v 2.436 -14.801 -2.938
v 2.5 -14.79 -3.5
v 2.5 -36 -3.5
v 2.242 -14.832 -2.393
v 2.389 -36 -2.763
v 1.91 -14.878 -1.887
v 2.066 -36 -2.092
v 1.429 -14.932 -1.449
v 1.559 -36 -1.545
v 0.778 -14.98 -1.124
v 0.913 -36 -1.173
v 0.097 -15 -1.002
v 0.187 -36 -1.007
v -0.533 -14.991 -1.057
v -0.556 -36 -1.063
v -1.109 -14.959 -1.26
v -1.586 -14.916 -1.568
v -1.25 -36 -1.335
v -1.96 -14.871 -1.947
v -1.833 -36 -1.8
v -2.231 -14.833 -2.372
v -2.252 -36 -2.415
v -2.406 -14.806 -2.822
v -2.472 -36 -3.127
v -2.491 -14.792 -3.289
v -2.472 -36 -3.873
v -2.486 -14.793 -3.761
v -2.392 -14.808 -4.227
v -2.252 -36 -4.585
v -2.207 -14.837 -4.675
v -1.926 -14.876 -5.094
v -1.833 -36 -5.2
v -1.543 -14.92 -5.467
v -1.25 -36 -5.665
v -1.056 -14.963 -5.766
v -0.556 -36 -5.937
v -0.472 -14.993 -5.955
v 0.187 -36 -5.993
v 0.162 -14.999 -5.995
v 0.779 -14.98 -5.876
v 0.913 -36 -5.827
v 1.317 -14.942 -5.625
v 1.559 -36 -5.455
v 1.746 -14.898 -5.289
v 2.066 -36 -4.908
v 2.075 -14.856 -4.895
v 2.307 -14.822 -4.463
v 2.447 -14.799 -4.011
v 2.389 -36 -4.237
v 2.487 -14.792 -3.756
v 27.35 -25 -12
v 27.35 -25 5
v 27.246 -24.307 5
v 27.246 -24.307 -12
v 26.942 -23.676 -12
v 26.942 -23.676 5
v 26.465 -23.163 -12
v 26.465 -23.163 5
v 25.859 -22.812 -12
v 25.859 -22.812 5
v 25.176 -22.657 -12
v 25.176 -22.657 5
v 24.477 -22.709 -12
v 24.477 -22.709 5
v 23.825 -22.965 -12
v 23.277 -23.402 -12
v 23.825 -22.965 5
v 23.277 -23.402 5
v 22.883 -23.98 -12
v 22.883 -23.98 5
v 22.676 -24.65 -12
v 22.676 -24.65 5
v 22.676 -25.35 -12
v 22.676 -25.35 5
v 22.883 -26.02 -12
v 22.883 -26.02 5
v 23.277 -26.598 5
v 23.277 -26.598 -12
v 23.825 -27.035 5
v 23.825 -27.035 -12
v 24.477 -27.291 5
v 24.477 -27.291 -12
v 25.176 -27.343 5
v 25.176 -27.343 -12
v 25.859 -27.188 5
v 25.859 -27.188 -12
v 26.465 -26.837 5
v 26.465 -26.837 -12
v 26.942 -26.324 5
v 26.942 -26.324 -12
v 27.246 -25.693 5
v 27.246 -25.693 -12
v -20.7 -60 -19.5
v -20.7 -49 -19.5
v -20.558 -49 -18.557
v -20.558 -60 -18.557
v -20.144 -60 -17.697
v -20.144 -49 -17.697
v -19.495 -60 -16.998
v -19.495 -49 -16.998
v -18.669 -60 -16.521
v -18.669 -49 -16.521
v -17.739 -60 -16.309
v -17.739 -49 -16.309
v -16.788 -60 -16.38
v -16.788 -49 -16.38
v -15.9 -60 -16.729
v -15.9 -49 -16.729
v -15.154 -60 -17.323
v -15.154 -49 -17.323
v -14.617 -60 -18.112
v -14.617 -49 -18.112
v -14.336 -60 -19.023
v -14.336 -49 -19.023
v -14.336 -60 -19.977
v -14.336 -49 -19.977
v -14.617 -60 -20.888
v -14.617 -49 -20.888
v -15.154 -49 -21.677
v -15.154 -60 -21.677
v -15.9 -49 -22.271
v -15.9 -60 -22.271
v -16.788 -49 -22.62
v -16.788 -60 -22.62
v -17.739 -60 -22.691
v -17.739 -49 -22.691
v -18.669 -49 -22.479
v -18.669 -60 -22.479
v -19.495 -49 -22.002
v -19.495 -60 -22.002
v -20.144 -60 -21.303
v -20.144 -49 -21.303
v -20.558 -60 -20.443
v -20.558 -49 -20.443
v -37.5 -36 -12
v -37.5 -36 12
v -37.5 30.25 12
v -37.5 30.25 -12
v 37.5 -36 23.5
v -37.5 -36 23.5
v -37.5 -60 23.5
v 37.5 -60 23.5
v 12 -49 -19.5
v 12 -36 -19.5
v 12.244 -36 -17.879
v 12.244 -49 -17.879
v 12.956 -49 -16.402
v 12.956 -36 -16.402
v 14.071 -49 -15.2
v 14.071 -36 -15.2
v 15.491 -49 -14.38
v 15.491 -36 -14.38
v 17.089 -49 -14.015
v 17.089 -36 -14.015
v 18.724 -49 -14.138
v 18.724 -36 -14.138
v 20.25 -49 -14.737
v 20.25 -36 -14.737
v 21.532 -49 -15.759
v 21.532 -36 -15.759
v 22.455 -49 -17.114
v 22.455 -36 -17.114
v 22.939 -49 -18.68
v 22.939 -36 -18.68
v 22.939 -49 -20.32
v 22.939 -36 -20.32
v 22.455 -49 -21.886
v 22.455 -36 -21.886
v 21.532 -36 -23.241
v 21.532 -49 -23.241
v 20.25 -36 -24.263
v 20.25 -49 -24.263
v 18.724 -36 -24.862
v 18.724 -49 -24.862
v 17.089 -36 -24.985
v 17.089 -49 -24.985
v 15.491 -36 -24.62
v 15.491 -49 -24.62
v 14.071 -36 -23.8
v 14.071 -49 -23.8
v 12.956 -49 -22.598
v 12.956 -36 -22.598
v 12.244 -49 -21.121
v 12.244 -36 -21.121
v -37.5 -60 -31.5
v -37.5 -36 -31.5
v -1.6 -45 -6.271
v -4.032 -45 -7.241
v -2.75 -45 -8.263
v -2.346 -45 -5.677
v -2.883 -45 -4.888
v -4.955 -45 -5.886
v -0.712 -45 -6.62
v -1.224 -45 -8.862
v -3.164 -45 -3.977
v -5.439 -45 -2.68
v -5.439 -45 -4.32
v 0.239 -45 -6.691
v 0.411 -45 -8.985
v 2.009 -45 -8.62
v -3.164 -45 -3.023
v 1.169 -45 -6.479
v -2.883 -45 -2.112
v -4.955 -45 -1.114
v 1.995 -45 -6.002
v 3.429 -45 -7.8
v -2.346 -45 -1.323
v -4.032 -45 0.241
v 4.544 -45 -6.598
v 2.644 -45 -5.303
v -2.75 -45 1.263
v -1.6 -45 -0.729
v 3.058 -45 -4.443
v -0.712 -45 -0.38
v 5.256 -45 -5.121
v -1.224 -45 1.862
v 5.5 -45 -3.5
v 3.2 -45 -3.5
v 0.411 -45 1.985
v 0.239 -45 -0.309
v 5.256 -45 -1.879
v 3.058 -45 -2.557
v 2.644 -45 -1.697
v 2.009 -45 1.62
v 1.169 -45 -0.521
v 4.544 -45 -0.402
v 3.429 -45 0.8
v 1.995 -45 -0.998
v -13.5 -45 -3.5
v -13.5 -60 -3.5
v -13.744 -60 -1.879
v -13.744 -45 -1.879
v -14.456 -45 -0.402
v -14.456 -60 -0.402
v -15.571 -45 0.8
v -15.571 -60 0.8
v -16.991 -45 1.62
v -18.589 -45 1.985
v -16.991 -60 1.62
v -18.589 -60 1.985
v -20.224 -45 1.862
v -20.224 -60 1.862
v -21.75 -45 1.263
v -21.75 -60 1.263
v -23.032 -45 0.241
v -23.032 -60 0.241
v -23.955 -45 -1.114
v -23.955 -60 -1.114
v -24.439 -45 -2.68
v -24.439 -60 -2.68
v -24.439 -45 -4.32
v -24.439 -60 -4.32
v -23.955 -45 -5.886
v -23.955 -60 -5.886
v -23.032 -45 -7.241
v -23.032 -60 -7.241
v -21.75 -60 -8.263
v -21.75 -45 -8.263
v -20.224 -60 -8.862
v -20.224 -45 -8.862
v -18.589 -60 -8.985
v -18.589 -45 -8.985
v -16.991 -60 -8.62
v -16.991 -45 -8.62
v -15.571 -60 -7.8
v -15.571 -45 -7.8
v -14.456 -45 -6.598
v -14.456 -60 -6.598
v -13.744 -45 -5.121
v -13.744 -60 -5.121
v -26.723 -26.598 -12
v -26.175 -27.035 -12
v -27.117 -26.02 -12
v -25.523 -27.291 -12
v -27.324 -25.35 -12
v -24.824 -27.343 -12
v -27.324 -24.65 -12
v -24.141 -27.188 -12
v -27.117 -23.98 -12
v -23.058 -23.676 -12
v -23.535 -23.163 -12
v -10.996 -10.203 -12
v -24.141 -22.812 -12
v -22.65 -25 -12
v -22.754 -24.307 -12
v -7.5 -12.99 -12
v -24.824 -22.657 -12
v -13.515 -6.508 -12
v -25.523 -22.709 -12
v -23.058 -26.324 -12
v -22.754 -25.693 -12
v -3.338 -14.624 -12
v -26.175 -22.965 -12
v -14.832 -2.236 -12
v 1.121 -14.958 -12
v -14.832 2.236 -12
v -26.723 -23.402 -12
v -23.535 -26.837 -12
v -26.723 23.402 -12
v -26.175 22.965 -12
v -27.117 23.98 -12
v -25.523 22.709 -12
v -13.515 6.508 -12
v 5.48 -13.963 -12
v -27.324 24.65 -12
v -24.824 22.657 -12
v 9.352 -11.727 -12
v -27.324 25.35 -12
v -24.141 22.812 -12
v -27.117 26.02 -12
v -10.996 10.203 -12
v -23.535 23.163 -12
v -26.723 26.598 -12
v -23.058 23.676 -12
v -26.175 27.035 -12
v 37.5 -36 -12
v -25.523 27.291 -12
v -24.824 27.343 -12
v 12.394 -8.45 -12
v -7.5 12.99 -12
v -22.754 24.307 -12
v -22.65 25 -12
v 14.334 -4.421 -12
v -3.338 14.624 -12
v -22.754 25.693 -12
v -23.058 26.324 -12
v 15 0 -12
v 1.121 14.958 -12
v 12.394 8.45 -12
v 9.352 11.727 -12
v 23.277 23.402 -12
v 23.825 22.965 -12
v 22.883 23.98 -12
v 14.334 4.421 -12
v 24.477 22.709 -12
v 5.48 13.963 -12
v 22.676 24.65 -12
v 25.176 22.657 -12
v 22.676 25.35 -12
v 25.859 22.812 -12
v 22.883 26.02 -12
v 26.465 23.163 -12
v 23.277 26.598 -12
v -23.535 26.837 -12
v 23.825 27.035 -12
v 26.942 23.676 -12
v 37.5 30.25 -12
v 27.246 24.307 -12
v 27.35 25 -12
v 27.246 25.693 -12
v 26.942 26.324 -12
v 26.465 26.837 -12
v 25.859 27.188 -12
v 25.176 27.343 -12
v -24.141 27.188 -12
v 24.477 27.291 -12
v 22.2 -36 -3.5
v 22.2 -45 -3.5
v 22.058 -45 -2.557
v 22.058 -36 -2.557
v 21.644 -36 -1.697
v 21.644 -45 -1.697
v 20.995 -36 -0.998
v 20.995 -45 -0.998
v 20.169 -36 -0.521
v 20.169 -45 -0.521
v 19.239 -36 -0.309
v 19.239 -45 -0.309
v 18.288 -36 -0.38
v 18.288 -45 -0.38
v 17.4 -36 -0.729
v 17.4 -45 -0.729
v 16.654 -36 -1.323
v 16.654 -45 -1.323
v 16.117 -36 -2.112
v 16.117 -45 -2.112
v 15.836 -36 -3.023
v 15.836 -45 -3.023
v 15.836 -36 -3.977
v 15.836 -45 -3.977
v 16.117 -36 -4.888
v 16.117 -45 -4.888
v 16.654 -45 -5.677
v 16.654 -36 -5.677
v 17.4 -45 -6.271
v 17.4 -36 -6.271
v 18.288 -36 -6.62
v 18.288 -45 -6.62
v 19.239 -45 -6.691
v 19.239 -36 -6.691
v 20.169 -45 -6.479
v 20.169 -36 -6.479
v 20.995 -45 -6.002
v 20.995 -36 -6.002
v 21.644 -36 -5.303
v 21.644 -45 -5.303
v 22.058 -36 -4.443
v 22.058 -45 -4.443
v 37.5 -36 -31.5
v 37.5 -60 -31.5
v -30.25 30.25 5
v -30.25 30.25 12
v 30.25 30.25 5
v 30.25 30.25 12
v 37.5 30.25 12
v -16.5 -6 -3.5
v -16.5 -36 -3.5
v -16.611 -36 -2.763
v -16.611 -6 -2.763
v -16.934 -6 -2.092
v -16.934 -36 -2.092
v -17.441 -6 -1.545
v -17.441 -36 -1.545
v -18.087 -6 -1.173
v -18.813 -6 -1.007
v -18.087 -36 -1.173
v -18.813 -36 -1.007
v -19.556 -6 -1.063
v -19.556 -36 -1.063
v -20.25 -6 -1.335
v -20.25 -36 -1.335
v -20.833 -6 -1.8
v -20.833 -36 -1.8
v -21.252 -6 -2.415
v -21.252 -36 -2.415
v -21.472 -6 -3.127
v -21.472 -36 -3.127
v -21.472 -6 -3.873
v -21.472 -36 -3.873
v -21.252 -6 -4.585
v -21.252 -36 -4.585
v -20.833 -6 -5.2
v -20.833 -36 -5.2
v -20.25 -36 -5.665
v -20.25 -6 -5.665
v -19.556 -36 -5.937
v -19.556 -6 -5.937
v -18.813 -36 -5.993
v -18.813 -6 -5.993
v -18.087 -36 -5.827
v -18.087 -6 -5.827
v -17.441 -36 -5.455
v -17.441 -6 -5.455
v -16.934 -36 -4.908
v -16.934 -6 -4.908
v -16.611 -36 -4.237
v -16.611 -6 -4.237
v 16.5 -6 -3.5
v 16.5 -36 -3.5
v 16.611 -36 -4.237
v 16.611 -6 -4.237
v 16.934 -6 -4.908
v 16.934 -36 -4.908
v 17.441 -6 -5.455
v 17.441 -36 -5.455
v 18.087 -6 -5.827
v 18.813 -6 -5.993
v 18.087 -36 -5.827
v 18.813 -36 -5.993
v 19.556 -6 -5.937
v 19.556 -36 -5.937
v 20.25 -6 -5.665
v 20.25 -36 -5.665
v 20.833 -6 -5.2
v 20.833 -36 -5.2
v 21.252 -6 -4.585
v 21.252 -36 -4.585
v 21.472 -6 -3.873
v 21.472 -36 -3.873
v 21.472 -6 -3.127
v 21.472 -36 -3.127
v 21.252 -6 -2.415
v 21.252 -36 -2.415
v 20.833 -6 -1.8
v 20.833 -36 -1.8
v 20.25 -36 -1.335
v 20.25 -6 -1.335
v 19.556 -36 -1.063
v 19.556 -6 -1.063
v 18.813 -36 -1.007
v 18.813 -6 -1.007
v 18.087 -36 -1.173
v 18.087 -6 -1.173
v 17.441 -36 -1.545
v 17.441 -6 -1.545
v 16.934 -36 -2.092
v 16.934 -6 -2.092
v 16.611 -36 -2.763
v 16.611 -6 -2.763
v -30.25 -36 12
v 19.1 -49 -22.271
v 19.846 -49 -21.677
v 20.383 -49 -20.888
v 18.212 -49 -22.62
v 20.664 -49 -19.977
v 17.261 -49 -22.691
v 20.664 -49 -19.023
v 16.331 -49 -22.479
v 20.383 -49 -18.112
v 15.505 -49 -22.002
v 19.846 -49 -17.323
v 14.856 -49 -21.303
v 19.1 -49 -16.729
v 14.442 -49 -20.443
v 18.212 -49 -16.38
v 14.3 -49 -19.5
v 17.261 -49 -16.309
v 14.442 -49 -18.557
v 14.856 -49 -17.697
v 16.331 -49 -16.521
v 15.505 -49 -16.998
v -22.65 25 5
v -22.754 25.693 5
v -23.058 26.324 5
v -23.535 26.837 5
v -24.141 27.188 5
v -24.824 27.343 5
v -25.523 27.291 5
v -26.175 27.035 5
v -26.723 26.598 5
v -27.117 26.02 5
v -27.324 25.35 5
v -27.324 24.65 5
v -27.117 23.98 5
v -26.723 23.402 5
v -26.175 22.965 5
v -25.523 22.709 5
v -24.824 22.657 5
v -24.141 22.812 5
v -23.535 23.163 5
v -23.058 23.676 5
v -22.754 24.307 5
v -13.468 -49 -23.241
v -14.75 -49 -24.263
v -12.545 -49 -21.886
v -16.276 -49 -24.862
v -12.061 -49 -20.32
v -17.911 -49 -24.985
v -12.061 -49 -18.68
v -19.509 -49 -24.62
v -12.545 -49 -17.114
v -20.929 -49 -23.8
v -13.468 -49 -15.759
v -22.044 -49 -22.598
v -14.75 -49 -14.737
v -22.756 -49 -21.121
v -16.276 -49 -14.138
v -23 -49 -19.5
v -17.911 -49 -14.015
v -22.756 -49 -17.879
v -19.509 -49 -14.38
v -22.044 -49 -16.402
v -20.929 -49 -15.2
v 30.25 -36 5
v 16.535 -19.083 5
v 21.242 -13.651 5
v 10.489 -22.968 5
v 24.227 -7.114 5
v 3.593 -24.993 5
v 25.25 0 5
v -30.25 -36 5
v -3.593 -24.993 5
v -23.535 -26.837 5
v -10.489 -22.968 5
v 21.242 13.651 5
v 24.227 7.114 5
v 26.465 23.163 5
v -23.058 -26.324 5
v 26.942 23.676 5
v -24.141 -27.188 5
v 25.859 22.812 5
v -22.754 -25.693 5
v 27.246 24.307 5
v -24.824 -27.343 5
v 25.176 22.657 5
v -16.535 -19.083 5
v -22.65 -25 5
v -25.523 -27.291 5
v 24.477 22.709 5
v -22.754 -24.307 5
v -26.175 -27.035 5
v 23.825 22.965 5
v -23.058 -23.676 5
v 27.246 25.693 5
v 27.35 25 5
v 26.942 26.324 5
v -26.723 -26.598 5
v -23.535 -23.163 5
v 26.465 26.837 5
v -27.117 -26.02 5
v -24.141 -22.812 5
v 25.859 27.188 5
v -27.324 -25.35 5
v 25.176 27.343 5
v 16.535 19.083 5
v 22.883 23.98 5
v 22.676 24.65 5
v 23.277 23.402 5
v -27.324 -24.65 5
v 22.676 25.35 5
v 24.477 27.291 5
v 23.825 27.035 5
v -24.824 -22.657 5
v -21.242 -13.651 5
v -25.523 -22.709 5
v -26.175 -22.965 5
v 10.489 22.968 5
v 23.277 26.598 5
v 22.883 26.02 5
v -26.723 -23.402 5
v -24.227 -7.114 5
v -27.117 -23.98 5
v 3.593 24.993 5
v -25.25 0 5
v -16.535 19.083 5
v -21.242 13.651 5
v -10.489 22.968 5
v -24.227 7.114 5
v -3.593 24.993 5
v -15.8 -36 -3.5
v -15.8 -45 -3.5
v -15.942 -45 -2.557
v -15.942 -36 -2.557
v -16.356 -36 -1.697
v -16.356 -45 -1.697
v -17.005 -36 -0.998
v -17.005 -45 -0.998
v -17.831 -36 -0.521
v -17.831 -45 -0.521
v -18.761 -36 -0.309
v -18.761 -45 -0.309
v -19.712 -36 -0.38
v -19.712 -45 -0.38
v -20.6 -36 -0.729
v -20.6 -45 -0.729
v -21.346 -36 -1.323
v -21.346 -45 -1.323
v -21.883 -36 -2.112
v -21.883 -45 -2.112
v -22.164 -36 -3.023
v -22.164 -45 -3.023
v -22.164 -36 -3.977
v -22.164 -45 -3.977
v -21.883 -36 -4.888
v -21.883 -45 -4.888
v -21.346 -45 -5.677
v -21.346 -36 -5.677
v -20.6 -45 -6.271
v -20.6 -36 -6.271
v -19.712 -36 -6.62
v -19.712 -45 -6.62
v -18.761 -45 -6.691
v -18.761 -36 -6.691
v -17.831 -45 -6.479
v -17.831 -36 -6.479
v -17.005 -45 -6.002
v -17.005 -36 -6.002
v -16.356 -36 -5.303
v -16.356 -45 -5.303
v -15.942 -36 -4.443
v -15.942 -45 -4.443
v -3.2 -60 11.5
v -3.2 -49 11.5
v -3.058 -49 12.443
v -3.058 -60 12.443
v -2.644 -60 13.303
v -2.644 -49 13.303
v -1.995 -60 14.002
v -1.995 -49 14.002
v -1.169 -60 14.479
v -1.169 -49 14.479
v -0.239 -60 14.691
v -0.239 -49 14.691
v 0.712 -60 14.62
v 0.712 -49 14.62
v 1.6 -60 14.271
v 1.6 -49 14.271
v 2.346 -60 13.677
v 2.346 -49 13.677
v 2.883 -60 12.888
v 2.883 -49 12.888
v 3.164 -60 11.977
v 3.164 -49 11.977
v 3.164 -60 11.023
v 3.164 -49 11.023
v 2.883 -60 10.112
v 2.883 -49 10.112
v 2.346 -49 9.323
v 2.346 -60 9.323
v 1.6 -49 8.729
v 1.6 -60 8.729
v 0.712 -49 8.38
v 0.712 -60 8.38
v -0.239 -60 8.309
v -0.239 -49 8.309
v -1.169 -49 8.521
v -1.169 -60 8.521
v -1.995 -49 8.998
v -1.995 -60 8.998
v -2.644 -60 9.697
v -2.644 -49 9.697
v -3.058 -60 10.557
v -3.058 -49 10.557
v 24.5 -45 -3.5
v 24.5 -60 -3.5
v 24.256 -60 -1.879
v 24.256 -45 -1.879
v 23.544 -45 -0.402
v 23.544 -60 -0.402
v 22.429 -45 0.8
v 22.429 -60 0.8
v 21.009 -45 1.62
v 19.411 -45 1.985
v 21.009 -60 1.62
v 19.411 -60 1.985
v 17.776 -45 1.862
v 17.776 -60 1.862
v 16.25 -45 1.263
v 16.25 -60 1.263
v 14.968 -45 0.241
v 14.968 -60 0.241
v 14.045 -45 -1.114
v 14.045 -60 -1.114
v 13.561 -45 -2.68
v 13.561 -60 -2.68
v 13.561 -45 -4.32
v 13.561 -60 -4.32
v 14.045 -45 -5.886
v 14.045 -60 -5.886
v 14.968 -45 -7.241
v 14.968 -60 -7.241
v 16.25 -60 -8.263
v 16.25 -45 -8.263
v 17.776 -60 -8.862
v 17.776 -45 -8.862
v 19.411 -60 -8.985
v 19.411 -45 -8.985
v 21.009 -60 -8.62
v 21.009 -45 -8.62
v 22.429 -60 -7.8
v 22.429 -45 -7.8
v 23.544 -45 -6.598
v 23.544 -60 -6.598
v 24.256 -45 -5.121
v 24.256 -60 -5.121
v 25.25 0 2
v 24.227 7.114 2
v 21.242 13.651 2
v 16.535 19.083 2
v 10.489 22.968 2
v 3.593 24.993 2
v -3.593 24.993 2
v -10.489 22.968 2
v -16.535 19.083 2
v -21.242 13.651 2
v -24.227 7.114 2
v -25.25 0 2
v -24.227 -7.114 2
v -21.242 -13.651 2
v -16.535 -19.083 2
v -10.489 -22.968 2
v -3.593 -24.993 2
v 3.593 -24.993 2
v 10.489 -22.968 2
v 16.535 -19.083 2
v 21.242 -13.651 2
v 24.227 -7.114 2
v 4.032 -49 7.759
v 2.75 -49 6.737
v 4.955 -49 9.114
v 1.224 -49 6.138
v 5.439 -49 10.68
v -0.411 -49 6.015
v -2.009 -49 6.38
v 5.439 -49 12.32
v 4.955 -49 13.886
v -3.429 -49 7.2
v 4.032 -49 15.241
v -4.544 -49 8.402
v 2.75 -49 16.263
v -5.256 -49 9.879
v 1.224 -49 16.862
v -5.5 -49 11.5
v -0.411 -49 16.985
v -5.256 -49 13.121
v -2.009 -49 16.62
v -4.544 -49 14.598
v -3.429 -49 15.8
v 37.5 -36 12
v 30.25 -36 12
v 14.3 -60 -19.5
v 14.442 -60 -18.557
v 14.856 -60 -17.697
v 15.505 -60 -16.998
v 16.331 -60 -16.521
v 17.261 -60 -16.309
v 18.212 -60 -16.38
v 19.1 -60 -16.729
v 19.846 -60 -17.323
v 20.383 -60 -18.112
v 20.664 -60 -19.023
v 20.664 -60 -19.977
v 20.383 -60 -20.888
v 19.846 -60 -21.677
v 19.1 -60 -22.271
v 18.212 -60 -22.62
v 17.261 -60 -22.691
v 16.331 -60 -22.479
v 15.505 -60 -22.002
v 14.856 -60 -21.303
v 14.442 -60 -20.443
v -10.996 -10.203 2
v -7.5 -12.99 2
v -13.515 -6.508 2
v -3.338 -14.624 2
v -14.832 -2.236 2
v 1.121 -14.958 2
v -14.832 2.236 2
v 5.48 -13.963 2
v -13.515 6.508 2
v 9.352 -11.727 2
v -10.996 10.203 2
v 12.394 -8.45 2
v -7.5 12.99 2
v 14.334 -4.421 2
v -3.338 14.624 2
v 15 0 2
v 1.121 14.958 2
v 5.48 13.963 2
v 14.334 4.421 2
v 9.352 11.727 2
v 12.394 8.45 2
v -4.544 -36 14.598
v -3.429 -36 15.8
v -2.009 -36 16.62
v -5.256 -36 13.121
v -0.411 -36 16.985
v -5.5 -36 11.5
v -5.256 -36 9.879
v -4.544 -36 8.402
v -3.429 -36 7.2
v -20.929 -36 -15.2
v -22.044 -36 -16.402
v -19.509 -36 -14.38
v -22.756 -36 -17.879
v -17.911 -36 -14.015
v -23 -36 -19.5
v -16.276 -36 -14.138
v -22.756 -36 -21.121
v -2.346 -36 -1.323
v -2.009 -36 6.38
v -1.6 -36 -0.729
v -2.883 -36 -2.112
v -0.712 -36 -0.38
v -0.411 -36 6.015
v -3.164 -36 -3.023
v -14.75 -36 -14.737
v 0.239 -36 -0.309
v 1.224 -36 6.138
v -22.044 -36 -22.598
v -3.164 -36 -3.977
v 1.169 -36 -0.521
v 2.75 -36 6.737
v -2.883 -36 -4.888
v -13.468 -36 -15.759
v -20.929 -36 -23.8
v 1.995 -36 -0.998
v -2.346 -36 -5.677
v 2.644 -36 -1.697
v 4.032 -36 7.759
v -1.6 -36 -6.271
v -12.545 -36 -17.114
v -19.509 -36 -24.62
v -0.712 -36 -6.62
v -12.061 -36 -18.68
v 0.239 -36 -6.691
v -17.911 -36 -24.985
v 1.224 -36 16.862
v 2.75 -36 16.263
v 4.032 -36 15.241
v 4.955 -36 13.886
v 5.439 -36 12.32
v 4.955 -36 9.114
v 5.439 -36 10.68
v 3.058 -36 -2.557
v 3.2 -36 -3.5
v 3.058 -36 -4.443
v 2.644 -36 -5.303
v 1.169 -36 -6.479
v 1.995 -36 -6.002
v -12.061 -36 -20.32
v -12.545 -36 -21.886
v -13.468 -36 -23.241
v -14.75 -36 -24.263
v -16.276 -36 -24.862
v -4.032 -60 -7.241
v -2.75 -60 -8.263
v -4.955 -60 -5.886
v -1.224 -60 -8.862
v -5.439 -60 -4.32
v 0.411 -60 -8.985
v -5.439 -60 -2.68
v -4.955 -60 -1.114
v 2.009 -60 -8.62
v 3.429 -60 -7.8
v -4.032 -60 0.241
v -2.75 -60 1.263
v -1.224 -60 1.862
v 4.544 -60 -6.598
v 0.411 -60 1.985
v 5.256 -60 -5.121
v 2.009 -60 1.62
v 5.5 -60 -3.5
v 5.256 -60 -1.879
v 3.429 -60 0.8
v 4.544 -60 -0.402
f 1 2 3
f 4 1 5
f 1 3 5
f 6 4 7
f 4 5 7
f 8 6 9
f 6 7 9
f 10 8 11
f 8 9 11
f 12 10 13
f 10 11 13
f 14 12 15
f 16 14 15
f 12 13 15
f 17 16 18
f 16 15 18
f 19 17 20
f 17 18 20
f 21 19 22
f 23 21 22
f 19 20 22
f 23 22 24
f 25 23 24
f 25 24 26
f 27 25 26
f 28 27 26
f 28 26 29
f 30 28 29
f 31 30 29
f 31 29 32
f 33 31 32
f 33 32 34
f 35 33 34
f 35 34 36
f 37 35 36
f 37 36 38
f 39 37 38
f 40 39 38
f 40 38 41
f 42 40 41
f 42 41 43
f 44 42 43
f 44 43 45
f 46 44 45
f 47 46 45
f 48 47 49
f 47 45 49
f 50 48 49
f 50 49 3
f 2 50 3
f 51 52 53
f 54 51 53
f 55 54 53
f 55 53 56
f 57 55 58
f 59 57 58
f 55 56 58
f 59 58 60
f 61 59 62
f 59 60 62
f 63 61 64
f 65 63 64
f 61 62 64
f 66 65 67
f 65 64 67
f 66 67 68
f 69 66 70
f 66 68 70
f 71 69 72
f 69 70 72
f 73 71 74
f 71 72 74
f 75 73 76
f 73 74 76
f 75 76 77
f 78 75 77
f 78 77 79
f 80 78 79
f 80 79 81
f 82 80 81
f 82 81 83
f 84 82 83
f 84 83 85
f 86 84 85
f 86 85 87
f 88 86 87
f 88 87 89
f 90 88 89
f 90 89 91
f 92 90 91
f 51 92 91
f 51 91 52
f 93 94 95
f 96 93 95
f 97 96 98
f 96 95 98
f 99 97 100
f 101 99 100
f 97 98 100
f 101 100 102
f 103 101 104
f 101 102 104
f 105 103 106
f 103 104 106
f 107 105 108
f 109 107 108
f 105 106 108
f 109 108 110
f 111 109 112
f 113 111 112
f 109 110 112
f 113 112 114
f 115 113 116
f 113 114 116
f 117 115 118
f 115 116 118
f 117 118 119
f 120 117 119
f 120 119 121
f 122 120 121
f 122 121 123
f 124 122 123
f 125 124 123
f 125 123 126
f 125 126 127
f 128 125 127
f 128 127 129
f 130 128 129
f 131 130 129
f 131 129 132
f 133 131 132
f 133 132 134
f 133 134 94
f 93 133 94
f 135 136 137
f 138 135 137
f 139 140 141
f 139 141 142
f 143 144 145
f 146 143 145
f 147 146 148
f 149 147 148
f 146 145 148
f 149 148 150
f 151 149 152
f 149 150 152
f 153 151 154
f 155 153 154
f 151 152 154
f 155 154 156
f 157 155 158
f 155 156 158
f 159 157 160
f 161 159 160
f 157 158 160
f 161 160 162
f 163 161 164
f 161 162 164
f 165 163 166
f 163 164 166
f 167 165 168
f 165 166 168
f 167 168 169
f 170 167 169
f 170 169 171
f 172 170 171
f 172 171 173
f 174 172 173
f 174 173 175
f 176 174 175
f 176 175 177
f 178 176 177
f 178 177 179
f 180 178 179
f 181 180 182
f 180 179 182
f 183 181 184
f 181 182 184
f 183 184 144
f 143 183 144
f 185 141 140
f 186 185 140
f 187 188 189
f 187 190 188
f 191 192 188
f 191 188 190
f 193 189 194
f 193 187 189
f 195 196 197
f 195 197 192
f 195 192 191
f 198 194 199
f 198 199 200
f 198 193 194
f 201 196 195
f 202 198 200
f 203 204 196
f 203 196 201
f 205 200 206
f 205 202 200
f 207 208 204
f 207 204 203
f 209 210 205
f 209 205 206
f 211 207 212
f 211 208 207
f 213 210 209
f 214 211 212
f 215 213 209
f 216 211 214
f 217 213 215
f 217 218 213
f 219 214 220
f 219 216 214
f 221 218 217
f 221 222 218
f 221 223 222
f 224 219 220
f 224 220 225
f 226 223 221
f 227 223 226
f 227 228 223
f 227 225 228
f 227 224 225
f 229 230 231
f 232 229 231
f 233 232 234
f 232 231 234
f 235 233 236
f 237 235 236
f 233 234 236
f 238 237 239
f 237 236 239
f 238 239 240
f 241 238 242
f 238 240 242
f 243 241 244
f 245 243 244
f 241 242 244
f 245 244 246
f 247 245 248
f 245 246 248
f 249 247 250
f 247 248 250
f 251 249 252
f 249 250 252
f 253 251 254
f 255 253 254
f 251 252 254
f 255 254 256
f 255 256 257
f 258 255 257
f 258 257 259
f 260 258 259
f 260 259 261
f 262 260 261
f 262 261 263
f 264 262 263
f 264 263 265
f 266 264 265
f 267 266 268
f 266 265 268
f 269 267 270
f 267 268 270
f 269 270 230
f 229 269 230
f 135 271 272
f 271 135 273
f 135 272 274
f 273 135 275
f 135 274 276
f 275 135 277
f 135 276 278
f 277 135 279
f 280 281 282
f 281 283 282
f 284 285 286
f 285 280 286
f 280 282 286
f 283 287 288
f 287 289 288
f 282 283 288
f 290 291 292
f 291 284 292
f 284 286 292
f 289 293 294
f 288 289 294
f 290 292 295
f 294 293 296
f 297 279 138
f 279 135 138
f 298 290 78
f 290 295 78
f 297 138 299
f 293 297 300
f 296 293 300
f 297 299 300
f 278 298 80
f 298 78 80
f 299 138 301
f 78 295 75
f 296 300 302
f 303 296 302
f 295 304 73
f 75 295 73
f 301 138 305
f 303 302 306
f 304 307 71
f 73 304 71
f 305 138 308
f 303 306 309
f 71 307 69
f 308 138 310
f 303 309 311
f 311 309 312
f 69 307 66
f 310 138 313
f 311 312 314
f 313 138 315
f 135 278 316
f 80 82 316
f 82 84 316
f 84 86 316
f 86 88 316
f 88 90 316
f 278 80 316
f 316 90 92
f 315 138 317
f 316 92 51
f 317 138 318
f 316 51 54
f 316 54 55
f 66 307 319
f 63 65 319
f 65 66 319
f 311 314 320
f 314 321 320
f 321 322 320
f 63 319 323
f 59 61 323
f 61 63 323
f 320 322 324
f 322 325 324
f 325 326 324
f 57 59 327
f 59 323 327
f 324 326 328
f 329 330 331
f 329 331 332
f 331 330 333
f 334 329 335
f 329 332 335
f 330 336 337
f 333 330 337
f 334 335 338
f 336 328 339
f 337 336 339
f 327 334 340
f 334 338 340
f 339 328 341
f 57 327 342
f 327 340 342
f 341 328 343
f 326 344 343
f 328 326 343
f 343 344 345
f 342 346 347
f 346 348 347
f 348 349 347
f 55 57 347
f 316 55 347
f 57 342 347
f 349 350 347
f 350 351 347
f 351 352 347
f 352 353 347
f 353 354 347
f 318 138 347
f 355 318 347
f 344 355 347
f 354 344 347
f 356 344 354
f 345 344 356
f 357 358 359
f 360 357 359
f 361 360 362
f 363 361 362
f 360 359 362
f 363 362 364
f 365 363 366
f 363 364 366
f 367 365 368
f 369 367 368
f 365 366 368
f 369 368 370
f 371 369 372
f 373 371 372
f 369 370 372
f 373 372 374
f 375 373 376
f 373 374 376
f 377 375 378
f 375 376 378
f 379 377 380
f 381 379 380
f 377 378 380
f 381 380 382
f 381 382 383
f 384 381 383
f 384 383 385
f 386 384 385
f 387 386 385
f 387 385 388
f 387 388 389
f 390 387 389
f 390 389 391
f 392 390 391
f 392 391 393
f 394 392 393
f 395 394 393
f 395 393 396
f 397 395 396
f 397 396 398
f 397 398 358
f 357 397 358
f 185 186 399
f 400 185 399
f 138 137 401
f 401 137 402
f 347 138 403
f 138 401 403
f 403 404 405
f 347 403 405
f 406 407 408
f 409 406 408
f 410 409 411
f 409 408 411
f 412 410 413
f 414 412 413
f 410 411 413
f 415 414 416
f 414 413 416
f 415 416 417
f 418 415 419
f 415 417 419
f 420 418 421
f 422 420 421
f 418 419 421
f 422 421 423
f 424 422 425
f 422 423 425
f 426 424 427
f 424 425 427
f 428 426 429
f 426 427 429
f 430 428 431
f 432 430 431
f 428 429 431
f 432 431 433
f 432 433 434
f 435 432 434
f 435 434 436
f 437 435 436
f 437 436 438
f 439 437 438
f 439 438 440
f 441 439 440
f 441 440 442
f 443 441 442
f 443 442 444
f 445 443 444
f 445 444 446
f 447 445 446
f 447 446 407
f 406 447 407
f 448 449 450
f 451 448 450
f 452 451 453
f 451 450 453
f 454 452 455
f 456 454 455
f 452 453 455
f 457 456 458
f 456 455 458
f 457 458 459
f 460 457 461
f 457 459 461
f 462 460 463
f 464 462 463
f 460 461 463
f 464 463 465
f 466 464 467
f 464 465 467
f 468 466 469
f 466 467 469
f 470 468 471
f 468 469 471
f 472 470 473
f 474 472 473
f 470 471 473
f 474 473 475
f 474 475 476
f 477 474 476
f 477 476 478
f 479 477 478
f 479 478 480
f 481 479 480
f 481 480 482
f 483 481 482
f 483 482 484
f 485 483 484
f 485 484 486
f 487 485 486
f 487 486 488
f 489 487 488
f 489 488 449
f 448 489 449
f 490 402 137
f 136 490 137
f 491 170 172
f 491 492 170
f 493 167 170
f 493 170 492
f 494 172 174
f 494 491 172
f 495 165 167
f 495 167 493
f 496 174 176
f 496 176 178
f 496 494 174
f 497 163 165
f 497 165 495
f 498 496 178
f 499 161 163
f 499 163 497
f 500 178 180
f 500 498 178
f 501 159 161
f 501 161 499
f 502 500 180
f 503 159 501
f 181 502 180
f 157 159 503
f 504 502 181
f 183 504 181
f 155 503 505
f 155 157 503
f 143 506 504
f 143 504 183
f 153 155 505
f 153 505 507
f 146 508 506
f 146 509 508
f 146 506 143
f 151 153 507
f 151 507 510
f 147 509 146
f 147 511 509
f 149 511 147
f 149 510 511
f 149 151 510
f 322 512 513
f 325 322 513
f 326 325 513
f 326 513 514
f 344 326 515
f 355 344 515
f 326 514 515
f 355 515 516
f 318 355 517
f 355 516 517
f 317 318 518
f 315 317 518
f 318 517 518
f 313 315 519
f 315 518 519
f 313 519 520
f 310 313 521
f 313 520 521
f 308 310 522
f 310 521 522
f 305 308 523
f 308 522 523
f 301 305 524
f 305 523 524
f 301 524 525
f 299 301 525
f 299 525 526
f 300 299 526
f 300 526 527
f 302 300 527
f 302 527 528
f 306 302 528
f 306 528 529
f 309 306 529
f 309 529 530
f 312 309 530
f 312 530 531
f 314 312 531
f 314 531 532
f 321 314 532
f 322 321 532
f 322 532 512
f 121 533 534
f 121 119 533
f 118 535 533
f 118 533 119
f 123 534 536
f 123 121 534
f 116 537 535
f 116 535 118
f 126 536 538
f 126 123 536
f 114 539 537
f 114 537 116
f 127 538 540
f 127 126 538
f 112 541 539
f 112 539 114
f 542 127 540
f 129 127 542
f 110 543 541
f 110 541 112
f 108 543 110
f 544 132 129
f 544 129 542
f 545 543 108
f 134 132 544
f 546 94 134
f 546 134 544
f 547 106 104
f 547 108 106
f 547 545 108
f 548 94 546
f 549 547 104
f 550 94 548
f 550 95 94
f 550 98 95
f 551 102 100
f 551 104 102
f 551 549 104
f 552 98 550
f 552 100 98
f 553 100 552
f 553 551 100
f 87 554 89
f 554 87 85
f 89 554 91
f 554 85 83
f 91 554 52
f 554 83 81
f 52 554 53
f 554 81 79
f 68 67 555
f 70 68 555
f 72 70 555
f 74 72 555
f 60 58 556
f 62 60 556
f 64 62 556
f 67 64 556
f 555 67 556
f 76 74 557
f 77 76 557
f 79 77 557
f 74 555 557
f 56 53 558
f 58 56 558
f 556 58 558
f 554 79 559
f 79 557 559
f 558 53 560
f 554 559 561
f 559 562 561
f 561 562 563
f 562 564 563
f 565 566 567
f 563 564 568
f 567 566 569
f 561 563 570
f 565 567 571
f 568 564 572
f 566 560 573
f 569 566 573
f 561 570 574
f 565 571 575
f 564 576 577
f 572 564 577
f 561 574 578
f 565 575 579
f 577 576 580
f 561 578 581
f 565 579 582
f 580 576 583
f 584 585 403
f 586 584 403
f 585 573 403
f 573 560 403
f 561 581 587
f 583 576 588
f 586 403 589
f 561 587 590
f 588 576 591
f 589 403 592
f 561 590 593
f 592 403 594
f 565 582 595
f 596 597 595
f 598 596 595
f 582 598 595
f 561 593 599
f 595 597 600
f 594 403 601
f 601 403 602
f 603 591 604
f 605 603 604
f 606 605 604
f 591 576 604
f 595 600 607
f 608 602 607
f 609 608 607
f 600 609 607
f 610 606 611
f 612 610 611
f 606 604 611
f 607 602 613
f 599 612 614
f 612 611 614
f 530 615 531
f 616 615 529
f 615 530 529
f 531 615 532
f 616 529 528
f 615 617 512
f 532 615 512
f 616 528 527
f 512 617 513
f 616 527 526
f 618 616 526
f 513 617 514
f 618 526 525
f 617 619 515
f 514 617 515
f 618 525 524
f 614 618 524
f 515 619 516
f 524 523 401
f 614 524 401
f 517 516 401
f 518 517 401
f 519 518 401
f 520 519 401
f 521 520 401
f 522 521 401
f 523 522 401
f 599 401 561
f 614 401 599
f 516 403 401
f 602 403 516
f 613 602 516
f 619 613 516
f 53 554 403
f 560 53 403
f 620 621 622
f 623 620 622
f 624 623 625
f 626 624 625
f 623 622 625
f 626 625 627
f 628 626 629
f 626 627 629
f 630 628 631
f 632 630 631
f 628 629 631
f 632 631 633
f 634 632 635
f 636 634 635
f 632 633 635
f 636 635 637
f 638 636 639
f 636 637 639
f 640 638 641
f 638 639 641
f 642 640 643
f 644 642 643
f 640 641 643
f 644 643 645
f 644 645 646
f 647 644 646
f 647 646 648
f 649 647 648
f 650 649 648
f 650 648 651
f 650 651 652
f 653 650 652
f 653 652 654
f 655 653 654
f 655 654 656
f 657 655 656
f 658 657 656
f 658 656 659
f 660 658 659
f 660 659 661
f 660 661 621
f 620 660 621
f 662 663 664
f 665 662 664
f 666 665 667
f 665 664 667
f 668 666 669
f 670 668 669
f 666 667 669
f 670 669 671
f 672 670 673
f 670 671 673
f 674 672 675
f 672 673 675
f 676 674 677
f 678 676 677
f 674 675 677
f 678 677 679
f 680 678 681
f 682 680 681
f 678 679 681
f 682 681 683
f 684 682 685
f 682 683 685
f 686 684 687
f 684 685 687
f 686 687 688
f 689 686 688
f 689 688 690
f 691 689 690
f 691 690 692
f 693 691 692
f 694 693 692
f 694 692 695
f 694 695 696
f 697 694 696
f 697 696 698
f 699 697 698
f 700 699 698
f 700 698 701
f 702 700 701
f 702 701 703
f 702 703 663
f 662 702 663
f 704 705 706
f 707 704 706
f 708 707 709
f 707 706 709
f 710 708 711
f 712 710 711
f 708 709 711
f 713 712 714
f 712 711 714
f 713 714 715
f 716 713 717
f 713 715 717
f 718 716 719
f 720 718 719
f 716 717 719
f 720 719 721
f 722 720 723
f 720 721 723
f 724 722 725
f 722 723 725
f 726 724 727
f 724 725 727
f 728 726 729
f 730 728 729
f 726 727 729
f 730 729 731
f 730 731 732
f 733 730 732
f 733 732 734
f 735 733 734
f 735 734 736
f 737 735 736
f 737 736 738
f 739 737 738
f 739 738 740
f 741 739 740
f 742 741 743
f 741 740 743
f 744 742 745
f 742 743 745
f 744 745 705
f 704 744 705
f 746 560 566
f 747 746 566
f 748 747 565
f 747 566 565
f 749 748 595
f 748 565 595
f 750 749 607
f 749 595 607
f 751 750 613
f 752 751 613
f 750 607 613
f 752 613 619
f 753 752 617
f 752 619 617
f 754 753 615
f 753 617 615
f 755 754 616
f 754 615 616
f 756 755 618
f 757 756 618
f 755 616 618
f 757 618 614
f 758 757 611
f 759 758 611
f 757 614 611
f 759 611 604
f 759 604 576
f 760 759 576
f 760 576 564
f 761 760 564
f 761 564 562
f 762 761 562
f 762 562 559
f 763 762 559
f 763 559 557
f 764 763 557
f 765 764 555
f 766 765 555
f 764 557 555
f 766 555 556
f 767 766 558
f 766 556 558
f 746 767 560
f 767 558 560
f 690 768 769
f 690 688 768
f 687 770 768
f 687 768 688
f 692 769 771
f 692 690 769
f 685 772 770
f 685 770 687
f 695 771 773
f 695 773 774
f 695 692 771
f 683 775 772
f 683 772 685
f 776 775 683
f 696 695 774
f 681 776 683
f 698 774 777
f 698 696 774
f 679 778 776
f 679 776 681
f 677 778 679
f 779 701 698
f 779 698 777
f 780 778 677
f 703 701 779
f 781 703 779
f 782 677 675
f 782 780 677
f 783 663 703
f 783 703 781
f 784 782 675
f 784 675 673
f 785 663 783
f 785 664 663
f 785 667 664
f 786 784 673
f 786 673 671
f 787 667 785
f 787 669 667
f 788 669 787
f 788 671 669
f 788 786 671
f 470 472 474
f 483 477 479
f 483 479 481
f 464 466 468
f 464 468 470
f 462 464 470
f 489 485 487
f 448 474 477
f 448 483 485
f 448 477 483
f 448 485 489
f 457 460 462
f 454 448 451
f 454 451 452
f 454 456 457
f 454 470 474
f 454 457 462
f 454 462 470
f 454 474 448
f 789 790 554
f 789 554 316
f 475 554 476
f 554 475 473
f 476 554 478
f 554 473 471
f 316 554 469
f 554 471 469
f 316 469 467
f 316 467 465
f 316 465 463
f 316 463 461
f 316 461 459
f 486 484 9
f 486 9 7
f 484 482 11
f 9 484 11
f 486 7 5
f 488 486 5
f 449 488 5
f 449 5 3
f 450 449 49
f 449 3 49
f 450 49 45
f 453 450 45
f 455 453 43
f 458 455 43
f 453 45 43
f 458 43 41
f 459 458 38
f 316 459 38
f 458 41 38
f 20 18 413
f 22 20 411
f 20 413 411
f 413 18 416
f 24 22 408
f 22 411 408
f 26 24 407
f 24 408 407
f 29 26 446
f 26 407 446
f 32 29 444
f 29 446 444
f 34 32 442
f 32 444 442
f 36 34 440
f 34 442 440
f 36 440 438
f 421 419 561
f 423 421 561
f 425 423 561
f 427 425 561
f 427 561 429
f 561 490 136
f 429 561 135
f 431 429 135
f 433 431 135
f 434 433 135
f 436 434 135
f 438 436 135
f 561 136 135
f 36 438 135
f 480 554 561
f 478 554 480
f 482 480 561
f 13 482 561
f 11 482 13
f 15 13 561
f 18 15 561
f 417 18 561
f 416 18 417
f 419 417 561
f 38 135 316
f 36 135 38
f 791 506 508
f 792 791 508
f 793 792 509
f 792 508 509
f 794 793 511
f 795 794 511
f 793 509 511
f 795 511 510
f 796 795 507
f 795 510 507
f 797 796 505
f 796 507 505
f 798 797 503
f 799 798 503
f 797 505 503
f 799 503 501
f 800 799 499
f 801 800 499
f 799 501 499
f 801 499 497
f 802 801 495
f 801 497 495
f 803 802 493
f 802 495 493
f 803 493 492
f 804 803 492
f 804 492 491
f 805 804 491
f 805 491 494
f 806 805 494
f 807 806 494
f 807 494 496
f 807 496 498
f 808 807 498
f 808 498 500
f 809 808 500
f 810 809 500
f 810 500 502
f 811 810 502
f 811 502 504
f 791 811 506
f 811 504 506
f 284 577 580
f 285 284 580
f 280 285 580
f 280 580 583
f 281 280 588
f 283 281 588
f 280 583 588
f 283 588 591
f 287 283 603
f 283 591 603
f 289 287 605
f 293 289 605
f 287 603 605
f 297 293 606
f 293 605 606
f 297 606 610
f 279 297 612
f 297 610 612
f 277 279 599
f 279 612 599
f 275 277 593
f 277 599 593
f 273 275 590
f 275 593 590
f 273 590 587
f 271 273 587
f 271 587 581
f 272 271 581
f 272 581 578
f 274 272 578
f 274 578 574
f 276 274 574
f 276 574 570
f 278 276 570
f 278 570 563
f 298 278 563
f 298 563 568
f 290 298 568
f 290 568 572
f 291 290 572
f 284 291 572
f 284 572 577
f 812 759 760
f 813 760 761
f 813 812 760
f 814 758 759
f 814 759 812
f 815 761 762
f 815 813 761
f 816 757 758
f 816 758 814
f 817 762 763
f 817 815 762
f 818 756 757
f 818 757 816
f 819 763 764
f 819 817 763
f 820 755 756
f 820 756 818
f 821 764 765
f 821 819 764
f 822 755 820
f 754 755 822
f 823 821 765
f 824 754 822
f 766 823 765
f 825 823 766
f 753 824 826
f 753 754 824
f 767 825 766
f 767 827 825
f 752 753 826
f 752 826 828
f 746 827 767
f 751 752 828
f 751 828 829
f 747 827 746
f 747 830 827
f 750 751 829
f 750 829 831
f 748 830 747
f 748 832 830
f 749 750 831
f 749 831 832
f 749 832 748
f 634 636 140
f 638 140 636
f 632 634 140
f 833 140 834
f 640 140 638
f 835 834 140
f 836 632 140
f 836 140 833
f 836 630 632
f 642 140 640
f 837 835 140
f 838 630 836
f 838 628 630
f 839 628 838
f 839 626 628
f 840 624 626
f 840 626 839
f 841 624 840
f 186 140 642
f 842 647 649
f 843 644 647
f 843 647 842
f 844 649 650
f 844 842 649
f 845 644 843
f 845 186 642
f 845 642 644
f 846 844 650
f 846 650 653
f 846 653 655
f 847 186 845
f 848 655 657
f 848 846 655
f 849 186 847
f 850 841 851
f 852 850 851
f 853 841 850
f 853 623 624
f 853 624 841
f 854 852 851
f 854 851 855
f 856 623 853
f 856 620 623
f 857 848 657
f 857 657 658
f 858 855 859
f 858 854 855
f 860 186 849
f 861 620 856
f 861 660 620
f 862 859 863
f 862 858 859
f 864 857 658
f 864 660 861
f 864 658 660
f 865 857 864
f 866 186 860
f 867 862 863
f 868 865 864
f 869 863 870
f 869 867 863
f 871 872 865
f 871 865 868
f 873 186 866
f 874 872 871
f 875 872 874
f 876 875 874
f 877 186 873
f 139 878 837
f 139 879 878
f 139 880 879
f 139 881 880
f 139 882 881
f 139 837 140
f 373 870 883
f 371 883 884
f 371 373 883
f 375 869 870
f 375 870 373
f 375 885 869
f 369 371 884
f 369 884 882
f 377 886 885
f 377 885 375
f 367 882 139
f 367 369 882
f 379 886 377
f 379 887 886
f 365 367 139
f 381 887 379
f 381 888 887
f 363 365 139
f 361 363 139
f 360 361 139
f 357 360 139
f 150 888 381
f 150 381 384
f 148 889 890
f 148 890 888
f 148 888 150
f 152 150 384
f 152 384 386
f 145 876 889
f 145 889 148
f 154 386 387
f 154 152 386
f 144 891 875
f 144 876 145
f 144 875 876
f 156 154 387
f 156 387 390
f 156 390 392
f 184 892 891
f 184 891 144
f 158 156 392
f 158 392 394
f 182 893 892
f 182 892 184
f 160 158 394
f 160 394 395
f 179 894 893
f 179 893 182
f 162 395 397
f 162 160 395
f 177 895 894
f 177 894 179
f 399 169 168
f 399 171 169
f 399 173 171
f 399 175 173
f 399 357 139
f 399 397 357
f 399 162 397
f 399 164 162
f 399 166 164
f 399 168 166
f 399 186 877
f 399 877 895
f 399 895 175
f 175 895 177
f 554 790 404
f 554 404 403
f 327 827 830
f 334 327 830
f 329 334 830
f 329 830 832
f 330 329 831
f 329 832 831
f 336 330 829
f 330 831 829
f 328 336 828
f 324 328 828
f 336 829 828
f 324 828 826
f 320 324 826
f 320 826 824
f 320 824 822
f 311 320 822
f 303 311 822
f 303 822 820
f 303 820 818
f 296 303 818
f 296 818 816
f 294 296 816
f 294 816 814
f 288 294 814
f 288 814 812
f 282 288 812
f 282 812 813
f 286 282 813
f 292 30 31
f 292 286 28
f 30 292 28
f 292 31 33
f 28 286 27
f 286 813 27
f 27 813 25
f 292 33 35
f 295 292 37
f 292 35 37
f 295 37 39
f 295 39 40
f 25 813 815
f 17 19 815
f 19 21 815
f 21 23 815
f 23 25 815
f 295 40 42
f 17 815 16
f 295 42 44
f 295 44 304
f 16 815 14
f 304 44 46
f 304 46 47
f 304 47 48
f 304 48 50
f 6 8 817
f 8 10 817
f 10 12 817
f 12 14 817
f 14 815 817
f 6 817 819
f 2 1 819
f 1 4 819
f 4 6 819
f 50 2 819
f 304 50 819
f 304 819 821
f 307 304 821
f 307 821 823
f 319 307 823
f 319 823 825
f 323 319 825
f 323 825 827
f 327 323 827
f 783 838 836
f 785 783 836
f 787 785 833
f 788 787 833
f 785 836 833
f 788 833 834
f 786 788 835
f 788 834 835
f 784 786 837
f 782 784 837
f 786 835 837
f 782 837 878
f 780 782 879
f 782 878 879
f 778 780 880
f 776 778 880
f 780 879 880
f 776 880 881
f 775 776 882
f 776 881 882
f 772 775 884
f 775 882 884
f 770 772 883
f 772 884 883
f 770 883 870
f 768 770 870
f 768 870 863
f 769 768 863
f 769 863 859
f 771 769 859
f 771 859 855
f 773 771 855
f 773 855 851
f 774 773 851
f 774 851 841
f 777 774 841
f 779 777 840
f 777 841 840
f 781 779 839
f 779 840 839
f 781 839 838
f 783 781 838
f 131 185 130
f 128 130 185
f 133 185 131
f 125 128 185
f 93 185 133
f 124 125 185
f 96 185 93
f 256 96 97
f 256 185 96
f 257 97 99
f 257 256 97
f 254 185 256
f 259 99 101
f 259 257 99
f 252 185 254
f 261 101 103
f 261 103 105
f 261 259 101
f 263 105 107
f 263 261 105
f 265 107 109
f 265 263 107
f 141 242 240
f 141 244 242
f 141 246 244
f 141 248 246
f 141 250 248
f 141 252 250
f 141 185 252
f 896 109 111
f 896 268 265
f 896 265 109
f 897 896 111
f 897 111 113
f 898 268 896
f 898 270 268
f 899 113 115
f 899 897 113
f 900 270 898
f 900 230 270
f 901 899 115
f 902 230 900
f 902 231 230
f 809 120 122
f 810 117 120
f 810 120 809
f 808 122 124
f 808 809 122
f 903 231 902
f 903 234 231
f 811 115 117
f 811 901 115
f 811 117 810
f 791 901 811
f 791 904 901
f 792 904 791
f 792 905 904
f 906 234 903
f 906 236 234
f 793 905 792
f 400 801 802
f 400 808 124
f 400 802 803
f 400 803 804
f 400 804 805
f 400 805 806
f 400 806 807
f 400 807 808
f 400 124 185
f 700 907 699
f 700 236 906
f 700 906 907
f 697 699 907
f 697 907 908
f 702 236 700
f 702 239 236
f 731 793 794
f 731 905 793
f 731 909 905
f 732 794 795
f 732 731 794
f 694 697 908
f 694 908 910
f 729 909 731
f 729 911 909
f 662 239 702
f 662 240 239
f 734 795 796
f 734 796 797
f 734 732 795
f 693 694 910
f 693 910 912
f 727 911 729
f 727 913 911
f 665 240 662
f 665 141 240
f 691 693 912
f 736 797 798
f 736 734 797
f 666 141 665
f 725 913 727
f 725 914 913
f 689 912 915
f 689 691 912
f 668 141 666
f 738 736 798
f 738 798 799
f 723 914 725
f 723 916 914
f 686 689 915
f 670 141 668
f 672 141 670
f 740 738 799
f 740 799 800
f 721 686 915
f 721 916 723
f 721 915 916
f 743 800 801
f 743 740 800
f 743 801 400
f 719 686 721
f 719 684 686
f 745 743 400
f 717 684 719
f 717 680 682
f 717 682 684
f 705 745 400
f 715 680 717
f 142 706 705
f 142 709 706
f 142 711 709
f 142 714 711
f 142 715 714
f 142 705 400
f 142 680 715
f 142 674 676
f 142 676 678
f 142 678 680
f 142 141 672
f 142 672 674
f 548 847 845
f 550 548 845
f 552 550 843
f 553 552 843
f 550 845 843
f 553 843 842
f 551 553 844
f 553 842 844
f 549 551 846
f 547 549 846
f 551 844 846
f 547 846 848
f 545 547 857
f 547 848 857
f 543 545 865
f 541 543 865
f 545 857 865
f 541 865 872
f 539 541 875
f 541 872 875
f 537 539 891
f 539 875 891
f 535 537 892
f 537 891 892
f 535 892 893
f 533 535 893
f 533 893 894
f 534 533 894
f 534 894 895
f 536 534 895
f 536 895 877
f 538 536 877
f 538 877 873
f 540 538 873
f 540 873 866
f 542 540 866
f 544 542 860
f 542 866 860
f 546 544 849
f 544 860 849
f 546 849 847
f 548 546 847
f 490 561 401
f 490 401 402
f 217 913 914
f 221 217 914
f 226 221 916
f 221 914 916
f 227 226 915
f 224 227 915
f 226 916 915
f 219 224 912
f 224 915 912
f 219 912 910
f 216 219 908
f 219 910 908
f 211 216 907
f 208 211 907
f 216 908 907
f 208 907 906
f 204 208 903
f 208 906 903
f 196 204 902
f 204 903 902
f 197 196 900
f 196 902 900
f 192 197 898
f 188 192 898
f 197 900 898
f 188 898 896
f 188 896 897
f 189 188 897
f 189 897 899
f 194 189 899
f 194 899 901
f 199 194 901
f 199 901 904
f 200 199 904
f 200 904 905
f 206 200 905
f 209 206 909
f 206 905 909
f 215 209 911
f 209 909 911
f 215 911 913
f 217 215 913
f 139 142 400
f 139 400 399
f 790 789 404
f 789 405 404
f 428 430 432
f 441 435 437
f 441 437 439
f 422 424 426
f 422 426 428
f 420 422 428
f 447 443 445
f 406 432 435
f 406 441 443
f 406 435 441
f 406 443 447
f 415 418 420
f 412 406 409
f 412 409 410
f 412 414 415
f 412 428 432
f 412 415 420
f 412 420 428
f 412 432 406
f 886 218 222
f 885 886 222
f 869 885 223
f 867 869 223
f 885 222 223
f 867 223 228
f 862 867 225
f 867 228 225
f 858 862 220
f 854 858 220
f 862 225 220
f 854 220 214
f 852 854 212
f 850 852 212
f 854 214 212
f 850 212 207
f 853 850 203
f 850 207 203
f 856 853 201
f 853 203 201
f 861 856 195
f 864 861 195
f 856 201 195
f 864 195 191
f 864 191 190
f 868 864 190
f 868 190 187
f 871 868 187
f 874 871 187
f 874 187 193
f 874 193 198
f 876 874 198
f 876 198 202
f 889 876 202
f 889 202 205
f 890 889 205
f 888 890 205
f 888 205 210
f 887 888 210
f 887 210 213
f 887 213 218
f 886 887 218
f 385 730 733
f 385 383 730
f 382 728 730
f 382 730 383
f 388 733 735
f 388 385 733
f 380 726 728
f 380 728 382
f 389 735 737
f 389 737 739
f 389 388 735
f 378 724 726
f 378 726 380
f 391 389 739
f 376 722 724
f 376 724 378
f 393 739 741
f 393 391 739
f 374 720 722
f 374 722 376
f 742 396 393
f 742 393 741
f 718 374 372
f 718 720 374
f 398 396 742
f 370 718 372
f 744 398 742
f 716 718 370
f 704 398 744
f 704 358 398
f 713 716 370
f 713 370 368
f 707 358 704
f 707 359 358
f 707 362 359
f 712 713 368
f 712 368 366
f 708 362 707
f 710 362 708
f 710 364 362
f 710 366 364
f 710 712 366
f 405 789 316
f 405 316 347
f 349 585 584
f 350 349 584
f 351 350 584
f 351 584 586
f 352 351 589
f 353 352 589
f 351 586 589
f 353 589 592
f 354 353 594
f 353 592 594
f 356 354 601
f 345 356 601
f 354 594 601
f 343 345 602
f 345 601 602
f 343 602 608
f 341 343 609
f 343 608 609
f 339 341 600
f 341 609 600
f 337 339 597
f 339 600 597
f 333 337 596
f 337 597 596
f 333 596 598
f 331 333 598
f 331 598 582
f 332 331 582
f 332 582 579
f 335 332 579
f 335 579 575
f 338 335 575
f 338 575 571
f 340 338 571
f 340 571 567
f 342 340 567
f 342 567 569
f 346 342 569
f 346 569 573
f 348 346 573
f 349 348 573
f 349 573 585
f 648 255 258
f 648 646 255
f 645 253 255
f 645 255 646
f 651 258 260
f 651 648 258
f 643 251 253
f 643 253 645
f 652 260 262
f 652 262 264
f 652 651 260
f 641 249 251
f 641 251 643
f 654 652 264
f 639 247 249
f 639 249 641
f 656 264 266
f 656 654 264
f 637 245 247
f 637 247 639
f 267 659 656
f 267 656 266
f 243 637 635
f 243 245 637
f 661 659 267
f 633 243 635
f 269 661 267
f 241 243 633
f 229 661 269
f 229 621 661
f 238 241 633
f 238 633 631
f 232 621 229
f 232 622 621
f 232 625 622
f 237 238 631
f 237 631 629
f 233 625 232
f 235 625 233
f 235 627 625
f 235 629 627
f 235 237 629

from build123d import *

# Parameters (mm, degrees)
SKETCH1_W              = 75
SKETCH1_H              = 72
BOSS_EXTRUDE1_DEPTH    = 12
SKETCH3_W              = 60.5
SKETCH3_H              = 60.5
CUT_EXTRUDE2_DEPTH     = 7
SKETCH2_R              = 25.25
CUT_EXTRUDE1_DEPTH     = 3
SKETCH4_R              = 15
CUT_EXTRUDE3_DEPTH     = 29
SKETCH5_W              = 75
SKETCH5_H              = 29.75
BOSS_EXTRUDE2_DEPTH    = 67
SKETCH6_W              = 75
SKETCH6_H              = 5.75
CUT_EXTRUDE4_DEPTH     = 67
SKETCH15_W             = 75
SKETCH15_H             = 55
CUT_EXTRUDE12_DEPTH    = 5.75
SKETCH7_R              = 3.2
CUT_EXTRUDE5_DEPTH     = 67
SKETCH9_OUTSIDE_W      = 112.624
SKETCH9_OUTSIDE_H      = 171.624
SKETCH9_OUTSIDE_W_2    = 75
SKETCH9_OUTSIDE_H_2    = 55
CUT_EXTRUDE7_DEPTH     = 102.411599435
SKETCH8_R              = 5.5
CUT_EXTRUDE6_DEPTH     = 13
SKETCH10_R             = 2.35
CUT_EXTRUDE8_DEPTH     = 80.614697136
SKETCH11_R             = 2.5
CUT_EXTRUDE9_DEPTH     = 54
SKETCH12_R             = 3.2
CUT_EXTRUDE10_DEPTH    = 24
SKETCH13_R             = 5.5
CUT_EXTRUDE11_DEPTH    = 15
SPLIT1_SURFACE_1_BACK  = 130.596
SPLIT1_SURFACE_1_DEPTH = 261.192
SPLIT1_SURFACE_2_BACK  = 130.596
SPLIT1_SURFACE_2_DEPTH = 261.192


with BuildPart() as part:
    # Sketch1 → Boss-Extrude1 (new, symmetric)
    with BuildSketch(Plane.XY):
        Rectangle(SKETCH1_W, SKETCH1_H)
    extrude(amount=BOSS_EXTRUDE1_DEPTH, both=True)

    # Sketch3 → Cut-Extrude2 (cut)
    with BuildSketch(Plane.XY.offset(12)):
        Rectangle(SKETCH3_W, SKETCH3_H)
    extrude(amount=-CUT_EXTRUDE2_DEPTH, mode=Mode.SUBTRACT)

    # Sketch2 → Cut-Extrude1 (cut)
    with BuildSketch(Plane.XY.offset(5)):
        Circle(SKETCH2_R)
    extrude(amount=-CUT_EXTRUDE1_DEPTH, mode=Mode.SUBTRACT)

    # Sketch4 → Cut-Extrude3 (cut)
    with BuildSketch(Plane.XY.offset(2)):
        Circle(SKETCH4_R)
    extrude(amount=-CUT_EXTRUDE3_DEPTH, mode=Mode.SUBTRACT)

    # Sketch5 → Boss-Extrude2 (add, symmetric)
    with BuildSketch(Plane.XY):
        with Locations((0, -45.125)):
            Rectangle(SKETCH5_W, SKETCH5_H)
    extrude(amount=BOSS_EXTRUDE2_DEPTH, both=True)

    # Sketch6 → Cut-Extrude4 (cut, symmetric)
    with BuildSketch(Plane.XY.offset(12)):
        with Locations((0, 33.125)):
            Rectangle(SKETCH6_W, SKETCH6_H)
    extrude(amount=CUT_EXTRUDE4_DEPTH, both=True, mode=Mode.SUBTRACT)

    # Sketch15 → Cut-Extrude12 (cut)
    with BuildSketch(Plane(origin=(0, -30.25, 0), x_dir=(1, 0, 0), z_dir=(0, 1, 0))):
        with Locations((0, 39.5)):
            Rectangle(SKETCH15_W, SKETCH15_H)
        Polygon((-30.25, -5), (-30.25, -12), (-37.5, -12), (-37.5, -67), (37.5, -67), (37.5, -12), (30.25, -12), (30.25, -5), align=None)
    extrude(amount=-CUT_EXTRUDE12_DEPTH, mode=Mode.SUBTRACT)

    # Sketch7 → Cut-Extrude5 (cut, symmetric)
    with BuildSketch(Plane(origin=(0, -36, 0), x_dir=(1, 0, 0), z_dir=(0, 1, 0))):
        with Locations(Location((-17.5, 19.5, 0), (0, 0, 180))):
            Circle(SKETCH7_R)
        with Locations(Location((0, -11.5, 0), (0, 0, 180))):
            Circle(SKETCH7_R)
        with Locations(Location((17.5, 19.5, 0), (0, 0, 180))):
            Circle(SKETCH7_R)
    extrude(amount=CUT_EXTRUDE5_DEPTH, both=True, mode=Mode.SUBTRACT)

    # Sketch9 outside → Cut-Extrude7 (cut, through all)
    with BuildSketch(Plane(origin=(0, -36, 0), x_dir=(1, 0, 0), z_dir=(0, 1, 0))):
        Rectangle(SKETCH9_OUTSIDE_W, SKETCH9_OUTSIDE_H)
        with Locations((0, 4)):
            Rectangle(SKETCH9_OUTSIDE_W_2, SKETCH9_OUTSIDE_H_2, mode=Mode.SUBTRACT)
    extrude(amount=-CUT_EXTRUDE7_DEPTH, mode=Mode.SUBTRACT)

    # Sketch8 → Cut-Extrude6 (cut)
    with BuildSketch(Plane(origin=(0, -36, 0), x_dir=(1, 0, 0), z_dir=(0, 1, 0))):
        with Locations(Location((-17.5, 19.5, 0), (0, 0, 180))):
            Circle(SKETCH8_R)
        with Locations(Location((17.5, 19.5, 0), (0, 0, 180))):
            Circle(SKETCH8_R)
        with Locations(Location((0, -11.5, 0), (0, 0, 180))):
            Circle(SKETCH8_R)
    extrude(amount=-CUT_EXTRUDE6_DEPTH, mode=Mode.SUBTRACT)

    # Sketch10 → Cut-Extrude8 (cut, through all)
    with BuildSketch(Plane.XY.offset(5)):
        with Locations((-25, 25)):
            Circle(SKETCH10_R)
        with Locations((25, 25)):
            Circle(SKETCH10_R)
        with Locations((25, -25)):
            Circle(SKETCH10_R)
        with Locations((-25, -25)):
            Circle(SKETCH10_R)
    extrude(amount=-CUT_EXTRUDE8_DEPTH, mode=Mode.SUBTRACT)

    # Sketch11 → Cut-Extrude9 (cut)
    with BuildSketch(Plane.XZ.offset(60)):
        with Locations((-19, -3.5)):
            Circle(SKETCH11_R)
        with Locations(Location((19, -3.5, 0), (0, 0, 180))):
            Circle(SKETCH11_R)
        with Locations((0, -3.5)):
            Circle(SKETCH11_R)
    extrude(amount=-CUT_EXTRUDE9_DEPTH, mode=Mode.SUBTRACT)

    # Sketch12 → Cut-Extrude10 (cut)
    with BuildSketch(Plane.XZ.offset(60)):
        with Locations((-19, -3.5)):
            Circle(SKETCH12_R)
        with Locations((0, -3.5)):
            Circle(SKETCH12_R)
        with Locations((19, -3.5)):
            Circle(SKETCH12_R)
    extrude(amount=-CUT_EXTRUDE10_DEPTH, mode=Mode.SUBTRACT)

    # Sketch13 → Cut-Extrude11 (cut)
    with BuildSketch(Plane.XZ.offset(60)):
        with Locations((-19, -3.5)):
            Circle(SKETCH13_R)
        with Locations((0, -3.5)):
            Circle(SKETCH13_R)
        with Locations((19, -3.5)):
            Circle(SKETCH13_R)
    extrude(amount=-CUT_EXTRUDE11_DEPTH, mode=Mode.SUBTRACT)


with BuildPart() as body_2:
    # Split1: the piece behind the surface
    add(part.part)
    # Split1 surface: a surface, the sketch's curves swept straight by 261.192 mm
    with BuildLine(Plane(origin=(37.5, 0, 0), x_dir=(0, 0, -1), z_dir=(1, 0, 0)).offset(-SPLIT1_SURFACE_1_BACK), mode=Mode.PRIVATE) as split1_surface_1_path:
        Line((-23.5, -36), (31.5, -36))
    split1_surface_1 = Shell.extrude(split1_surface_1_path.wire(), (1 * SPLIT1_SURFACE_1_DEPTH, 0 * SPLIT1_SURFACE_1_DEPTH, 0 * SPLIT1_SURFACE_1_DEPTH))
    split(bisect_by=split1_surface_1, keep=Keep.BOTTOM)


with BuildPart() as part_1:
    add(part.part)

    # Split1: split by a surface, the side it looks to stays
    # Split1 surface: a surface, the sketch's curves swept straight by 261.192 mm
    with BuildLine(Plane(origin=(37.5, 0, 0), x_dir=(0, 0, -1), z_dir=(1, 0, 0)).offset(-SPLIT1_SURFACE_2_BACK), mode=Mode.PRIVATE) as split1_surface_2_path:
        Line((-23.5, -36), (31.5, -36))
    split1_surface_2 = Shell.extrude(split1_surface_2_path.wire(), (1 * SPLIT1_SURFACE_2_DEPTH, 0 * SPLIT1_SURFACE_2_DEPTH, 0 * SPLIT1_SURFACE_2_DEPTH))
    split(bisect_by=split1_surface_2, keep=Keep.TOP)


solid = Compound([body_2.part, part_1.part])
